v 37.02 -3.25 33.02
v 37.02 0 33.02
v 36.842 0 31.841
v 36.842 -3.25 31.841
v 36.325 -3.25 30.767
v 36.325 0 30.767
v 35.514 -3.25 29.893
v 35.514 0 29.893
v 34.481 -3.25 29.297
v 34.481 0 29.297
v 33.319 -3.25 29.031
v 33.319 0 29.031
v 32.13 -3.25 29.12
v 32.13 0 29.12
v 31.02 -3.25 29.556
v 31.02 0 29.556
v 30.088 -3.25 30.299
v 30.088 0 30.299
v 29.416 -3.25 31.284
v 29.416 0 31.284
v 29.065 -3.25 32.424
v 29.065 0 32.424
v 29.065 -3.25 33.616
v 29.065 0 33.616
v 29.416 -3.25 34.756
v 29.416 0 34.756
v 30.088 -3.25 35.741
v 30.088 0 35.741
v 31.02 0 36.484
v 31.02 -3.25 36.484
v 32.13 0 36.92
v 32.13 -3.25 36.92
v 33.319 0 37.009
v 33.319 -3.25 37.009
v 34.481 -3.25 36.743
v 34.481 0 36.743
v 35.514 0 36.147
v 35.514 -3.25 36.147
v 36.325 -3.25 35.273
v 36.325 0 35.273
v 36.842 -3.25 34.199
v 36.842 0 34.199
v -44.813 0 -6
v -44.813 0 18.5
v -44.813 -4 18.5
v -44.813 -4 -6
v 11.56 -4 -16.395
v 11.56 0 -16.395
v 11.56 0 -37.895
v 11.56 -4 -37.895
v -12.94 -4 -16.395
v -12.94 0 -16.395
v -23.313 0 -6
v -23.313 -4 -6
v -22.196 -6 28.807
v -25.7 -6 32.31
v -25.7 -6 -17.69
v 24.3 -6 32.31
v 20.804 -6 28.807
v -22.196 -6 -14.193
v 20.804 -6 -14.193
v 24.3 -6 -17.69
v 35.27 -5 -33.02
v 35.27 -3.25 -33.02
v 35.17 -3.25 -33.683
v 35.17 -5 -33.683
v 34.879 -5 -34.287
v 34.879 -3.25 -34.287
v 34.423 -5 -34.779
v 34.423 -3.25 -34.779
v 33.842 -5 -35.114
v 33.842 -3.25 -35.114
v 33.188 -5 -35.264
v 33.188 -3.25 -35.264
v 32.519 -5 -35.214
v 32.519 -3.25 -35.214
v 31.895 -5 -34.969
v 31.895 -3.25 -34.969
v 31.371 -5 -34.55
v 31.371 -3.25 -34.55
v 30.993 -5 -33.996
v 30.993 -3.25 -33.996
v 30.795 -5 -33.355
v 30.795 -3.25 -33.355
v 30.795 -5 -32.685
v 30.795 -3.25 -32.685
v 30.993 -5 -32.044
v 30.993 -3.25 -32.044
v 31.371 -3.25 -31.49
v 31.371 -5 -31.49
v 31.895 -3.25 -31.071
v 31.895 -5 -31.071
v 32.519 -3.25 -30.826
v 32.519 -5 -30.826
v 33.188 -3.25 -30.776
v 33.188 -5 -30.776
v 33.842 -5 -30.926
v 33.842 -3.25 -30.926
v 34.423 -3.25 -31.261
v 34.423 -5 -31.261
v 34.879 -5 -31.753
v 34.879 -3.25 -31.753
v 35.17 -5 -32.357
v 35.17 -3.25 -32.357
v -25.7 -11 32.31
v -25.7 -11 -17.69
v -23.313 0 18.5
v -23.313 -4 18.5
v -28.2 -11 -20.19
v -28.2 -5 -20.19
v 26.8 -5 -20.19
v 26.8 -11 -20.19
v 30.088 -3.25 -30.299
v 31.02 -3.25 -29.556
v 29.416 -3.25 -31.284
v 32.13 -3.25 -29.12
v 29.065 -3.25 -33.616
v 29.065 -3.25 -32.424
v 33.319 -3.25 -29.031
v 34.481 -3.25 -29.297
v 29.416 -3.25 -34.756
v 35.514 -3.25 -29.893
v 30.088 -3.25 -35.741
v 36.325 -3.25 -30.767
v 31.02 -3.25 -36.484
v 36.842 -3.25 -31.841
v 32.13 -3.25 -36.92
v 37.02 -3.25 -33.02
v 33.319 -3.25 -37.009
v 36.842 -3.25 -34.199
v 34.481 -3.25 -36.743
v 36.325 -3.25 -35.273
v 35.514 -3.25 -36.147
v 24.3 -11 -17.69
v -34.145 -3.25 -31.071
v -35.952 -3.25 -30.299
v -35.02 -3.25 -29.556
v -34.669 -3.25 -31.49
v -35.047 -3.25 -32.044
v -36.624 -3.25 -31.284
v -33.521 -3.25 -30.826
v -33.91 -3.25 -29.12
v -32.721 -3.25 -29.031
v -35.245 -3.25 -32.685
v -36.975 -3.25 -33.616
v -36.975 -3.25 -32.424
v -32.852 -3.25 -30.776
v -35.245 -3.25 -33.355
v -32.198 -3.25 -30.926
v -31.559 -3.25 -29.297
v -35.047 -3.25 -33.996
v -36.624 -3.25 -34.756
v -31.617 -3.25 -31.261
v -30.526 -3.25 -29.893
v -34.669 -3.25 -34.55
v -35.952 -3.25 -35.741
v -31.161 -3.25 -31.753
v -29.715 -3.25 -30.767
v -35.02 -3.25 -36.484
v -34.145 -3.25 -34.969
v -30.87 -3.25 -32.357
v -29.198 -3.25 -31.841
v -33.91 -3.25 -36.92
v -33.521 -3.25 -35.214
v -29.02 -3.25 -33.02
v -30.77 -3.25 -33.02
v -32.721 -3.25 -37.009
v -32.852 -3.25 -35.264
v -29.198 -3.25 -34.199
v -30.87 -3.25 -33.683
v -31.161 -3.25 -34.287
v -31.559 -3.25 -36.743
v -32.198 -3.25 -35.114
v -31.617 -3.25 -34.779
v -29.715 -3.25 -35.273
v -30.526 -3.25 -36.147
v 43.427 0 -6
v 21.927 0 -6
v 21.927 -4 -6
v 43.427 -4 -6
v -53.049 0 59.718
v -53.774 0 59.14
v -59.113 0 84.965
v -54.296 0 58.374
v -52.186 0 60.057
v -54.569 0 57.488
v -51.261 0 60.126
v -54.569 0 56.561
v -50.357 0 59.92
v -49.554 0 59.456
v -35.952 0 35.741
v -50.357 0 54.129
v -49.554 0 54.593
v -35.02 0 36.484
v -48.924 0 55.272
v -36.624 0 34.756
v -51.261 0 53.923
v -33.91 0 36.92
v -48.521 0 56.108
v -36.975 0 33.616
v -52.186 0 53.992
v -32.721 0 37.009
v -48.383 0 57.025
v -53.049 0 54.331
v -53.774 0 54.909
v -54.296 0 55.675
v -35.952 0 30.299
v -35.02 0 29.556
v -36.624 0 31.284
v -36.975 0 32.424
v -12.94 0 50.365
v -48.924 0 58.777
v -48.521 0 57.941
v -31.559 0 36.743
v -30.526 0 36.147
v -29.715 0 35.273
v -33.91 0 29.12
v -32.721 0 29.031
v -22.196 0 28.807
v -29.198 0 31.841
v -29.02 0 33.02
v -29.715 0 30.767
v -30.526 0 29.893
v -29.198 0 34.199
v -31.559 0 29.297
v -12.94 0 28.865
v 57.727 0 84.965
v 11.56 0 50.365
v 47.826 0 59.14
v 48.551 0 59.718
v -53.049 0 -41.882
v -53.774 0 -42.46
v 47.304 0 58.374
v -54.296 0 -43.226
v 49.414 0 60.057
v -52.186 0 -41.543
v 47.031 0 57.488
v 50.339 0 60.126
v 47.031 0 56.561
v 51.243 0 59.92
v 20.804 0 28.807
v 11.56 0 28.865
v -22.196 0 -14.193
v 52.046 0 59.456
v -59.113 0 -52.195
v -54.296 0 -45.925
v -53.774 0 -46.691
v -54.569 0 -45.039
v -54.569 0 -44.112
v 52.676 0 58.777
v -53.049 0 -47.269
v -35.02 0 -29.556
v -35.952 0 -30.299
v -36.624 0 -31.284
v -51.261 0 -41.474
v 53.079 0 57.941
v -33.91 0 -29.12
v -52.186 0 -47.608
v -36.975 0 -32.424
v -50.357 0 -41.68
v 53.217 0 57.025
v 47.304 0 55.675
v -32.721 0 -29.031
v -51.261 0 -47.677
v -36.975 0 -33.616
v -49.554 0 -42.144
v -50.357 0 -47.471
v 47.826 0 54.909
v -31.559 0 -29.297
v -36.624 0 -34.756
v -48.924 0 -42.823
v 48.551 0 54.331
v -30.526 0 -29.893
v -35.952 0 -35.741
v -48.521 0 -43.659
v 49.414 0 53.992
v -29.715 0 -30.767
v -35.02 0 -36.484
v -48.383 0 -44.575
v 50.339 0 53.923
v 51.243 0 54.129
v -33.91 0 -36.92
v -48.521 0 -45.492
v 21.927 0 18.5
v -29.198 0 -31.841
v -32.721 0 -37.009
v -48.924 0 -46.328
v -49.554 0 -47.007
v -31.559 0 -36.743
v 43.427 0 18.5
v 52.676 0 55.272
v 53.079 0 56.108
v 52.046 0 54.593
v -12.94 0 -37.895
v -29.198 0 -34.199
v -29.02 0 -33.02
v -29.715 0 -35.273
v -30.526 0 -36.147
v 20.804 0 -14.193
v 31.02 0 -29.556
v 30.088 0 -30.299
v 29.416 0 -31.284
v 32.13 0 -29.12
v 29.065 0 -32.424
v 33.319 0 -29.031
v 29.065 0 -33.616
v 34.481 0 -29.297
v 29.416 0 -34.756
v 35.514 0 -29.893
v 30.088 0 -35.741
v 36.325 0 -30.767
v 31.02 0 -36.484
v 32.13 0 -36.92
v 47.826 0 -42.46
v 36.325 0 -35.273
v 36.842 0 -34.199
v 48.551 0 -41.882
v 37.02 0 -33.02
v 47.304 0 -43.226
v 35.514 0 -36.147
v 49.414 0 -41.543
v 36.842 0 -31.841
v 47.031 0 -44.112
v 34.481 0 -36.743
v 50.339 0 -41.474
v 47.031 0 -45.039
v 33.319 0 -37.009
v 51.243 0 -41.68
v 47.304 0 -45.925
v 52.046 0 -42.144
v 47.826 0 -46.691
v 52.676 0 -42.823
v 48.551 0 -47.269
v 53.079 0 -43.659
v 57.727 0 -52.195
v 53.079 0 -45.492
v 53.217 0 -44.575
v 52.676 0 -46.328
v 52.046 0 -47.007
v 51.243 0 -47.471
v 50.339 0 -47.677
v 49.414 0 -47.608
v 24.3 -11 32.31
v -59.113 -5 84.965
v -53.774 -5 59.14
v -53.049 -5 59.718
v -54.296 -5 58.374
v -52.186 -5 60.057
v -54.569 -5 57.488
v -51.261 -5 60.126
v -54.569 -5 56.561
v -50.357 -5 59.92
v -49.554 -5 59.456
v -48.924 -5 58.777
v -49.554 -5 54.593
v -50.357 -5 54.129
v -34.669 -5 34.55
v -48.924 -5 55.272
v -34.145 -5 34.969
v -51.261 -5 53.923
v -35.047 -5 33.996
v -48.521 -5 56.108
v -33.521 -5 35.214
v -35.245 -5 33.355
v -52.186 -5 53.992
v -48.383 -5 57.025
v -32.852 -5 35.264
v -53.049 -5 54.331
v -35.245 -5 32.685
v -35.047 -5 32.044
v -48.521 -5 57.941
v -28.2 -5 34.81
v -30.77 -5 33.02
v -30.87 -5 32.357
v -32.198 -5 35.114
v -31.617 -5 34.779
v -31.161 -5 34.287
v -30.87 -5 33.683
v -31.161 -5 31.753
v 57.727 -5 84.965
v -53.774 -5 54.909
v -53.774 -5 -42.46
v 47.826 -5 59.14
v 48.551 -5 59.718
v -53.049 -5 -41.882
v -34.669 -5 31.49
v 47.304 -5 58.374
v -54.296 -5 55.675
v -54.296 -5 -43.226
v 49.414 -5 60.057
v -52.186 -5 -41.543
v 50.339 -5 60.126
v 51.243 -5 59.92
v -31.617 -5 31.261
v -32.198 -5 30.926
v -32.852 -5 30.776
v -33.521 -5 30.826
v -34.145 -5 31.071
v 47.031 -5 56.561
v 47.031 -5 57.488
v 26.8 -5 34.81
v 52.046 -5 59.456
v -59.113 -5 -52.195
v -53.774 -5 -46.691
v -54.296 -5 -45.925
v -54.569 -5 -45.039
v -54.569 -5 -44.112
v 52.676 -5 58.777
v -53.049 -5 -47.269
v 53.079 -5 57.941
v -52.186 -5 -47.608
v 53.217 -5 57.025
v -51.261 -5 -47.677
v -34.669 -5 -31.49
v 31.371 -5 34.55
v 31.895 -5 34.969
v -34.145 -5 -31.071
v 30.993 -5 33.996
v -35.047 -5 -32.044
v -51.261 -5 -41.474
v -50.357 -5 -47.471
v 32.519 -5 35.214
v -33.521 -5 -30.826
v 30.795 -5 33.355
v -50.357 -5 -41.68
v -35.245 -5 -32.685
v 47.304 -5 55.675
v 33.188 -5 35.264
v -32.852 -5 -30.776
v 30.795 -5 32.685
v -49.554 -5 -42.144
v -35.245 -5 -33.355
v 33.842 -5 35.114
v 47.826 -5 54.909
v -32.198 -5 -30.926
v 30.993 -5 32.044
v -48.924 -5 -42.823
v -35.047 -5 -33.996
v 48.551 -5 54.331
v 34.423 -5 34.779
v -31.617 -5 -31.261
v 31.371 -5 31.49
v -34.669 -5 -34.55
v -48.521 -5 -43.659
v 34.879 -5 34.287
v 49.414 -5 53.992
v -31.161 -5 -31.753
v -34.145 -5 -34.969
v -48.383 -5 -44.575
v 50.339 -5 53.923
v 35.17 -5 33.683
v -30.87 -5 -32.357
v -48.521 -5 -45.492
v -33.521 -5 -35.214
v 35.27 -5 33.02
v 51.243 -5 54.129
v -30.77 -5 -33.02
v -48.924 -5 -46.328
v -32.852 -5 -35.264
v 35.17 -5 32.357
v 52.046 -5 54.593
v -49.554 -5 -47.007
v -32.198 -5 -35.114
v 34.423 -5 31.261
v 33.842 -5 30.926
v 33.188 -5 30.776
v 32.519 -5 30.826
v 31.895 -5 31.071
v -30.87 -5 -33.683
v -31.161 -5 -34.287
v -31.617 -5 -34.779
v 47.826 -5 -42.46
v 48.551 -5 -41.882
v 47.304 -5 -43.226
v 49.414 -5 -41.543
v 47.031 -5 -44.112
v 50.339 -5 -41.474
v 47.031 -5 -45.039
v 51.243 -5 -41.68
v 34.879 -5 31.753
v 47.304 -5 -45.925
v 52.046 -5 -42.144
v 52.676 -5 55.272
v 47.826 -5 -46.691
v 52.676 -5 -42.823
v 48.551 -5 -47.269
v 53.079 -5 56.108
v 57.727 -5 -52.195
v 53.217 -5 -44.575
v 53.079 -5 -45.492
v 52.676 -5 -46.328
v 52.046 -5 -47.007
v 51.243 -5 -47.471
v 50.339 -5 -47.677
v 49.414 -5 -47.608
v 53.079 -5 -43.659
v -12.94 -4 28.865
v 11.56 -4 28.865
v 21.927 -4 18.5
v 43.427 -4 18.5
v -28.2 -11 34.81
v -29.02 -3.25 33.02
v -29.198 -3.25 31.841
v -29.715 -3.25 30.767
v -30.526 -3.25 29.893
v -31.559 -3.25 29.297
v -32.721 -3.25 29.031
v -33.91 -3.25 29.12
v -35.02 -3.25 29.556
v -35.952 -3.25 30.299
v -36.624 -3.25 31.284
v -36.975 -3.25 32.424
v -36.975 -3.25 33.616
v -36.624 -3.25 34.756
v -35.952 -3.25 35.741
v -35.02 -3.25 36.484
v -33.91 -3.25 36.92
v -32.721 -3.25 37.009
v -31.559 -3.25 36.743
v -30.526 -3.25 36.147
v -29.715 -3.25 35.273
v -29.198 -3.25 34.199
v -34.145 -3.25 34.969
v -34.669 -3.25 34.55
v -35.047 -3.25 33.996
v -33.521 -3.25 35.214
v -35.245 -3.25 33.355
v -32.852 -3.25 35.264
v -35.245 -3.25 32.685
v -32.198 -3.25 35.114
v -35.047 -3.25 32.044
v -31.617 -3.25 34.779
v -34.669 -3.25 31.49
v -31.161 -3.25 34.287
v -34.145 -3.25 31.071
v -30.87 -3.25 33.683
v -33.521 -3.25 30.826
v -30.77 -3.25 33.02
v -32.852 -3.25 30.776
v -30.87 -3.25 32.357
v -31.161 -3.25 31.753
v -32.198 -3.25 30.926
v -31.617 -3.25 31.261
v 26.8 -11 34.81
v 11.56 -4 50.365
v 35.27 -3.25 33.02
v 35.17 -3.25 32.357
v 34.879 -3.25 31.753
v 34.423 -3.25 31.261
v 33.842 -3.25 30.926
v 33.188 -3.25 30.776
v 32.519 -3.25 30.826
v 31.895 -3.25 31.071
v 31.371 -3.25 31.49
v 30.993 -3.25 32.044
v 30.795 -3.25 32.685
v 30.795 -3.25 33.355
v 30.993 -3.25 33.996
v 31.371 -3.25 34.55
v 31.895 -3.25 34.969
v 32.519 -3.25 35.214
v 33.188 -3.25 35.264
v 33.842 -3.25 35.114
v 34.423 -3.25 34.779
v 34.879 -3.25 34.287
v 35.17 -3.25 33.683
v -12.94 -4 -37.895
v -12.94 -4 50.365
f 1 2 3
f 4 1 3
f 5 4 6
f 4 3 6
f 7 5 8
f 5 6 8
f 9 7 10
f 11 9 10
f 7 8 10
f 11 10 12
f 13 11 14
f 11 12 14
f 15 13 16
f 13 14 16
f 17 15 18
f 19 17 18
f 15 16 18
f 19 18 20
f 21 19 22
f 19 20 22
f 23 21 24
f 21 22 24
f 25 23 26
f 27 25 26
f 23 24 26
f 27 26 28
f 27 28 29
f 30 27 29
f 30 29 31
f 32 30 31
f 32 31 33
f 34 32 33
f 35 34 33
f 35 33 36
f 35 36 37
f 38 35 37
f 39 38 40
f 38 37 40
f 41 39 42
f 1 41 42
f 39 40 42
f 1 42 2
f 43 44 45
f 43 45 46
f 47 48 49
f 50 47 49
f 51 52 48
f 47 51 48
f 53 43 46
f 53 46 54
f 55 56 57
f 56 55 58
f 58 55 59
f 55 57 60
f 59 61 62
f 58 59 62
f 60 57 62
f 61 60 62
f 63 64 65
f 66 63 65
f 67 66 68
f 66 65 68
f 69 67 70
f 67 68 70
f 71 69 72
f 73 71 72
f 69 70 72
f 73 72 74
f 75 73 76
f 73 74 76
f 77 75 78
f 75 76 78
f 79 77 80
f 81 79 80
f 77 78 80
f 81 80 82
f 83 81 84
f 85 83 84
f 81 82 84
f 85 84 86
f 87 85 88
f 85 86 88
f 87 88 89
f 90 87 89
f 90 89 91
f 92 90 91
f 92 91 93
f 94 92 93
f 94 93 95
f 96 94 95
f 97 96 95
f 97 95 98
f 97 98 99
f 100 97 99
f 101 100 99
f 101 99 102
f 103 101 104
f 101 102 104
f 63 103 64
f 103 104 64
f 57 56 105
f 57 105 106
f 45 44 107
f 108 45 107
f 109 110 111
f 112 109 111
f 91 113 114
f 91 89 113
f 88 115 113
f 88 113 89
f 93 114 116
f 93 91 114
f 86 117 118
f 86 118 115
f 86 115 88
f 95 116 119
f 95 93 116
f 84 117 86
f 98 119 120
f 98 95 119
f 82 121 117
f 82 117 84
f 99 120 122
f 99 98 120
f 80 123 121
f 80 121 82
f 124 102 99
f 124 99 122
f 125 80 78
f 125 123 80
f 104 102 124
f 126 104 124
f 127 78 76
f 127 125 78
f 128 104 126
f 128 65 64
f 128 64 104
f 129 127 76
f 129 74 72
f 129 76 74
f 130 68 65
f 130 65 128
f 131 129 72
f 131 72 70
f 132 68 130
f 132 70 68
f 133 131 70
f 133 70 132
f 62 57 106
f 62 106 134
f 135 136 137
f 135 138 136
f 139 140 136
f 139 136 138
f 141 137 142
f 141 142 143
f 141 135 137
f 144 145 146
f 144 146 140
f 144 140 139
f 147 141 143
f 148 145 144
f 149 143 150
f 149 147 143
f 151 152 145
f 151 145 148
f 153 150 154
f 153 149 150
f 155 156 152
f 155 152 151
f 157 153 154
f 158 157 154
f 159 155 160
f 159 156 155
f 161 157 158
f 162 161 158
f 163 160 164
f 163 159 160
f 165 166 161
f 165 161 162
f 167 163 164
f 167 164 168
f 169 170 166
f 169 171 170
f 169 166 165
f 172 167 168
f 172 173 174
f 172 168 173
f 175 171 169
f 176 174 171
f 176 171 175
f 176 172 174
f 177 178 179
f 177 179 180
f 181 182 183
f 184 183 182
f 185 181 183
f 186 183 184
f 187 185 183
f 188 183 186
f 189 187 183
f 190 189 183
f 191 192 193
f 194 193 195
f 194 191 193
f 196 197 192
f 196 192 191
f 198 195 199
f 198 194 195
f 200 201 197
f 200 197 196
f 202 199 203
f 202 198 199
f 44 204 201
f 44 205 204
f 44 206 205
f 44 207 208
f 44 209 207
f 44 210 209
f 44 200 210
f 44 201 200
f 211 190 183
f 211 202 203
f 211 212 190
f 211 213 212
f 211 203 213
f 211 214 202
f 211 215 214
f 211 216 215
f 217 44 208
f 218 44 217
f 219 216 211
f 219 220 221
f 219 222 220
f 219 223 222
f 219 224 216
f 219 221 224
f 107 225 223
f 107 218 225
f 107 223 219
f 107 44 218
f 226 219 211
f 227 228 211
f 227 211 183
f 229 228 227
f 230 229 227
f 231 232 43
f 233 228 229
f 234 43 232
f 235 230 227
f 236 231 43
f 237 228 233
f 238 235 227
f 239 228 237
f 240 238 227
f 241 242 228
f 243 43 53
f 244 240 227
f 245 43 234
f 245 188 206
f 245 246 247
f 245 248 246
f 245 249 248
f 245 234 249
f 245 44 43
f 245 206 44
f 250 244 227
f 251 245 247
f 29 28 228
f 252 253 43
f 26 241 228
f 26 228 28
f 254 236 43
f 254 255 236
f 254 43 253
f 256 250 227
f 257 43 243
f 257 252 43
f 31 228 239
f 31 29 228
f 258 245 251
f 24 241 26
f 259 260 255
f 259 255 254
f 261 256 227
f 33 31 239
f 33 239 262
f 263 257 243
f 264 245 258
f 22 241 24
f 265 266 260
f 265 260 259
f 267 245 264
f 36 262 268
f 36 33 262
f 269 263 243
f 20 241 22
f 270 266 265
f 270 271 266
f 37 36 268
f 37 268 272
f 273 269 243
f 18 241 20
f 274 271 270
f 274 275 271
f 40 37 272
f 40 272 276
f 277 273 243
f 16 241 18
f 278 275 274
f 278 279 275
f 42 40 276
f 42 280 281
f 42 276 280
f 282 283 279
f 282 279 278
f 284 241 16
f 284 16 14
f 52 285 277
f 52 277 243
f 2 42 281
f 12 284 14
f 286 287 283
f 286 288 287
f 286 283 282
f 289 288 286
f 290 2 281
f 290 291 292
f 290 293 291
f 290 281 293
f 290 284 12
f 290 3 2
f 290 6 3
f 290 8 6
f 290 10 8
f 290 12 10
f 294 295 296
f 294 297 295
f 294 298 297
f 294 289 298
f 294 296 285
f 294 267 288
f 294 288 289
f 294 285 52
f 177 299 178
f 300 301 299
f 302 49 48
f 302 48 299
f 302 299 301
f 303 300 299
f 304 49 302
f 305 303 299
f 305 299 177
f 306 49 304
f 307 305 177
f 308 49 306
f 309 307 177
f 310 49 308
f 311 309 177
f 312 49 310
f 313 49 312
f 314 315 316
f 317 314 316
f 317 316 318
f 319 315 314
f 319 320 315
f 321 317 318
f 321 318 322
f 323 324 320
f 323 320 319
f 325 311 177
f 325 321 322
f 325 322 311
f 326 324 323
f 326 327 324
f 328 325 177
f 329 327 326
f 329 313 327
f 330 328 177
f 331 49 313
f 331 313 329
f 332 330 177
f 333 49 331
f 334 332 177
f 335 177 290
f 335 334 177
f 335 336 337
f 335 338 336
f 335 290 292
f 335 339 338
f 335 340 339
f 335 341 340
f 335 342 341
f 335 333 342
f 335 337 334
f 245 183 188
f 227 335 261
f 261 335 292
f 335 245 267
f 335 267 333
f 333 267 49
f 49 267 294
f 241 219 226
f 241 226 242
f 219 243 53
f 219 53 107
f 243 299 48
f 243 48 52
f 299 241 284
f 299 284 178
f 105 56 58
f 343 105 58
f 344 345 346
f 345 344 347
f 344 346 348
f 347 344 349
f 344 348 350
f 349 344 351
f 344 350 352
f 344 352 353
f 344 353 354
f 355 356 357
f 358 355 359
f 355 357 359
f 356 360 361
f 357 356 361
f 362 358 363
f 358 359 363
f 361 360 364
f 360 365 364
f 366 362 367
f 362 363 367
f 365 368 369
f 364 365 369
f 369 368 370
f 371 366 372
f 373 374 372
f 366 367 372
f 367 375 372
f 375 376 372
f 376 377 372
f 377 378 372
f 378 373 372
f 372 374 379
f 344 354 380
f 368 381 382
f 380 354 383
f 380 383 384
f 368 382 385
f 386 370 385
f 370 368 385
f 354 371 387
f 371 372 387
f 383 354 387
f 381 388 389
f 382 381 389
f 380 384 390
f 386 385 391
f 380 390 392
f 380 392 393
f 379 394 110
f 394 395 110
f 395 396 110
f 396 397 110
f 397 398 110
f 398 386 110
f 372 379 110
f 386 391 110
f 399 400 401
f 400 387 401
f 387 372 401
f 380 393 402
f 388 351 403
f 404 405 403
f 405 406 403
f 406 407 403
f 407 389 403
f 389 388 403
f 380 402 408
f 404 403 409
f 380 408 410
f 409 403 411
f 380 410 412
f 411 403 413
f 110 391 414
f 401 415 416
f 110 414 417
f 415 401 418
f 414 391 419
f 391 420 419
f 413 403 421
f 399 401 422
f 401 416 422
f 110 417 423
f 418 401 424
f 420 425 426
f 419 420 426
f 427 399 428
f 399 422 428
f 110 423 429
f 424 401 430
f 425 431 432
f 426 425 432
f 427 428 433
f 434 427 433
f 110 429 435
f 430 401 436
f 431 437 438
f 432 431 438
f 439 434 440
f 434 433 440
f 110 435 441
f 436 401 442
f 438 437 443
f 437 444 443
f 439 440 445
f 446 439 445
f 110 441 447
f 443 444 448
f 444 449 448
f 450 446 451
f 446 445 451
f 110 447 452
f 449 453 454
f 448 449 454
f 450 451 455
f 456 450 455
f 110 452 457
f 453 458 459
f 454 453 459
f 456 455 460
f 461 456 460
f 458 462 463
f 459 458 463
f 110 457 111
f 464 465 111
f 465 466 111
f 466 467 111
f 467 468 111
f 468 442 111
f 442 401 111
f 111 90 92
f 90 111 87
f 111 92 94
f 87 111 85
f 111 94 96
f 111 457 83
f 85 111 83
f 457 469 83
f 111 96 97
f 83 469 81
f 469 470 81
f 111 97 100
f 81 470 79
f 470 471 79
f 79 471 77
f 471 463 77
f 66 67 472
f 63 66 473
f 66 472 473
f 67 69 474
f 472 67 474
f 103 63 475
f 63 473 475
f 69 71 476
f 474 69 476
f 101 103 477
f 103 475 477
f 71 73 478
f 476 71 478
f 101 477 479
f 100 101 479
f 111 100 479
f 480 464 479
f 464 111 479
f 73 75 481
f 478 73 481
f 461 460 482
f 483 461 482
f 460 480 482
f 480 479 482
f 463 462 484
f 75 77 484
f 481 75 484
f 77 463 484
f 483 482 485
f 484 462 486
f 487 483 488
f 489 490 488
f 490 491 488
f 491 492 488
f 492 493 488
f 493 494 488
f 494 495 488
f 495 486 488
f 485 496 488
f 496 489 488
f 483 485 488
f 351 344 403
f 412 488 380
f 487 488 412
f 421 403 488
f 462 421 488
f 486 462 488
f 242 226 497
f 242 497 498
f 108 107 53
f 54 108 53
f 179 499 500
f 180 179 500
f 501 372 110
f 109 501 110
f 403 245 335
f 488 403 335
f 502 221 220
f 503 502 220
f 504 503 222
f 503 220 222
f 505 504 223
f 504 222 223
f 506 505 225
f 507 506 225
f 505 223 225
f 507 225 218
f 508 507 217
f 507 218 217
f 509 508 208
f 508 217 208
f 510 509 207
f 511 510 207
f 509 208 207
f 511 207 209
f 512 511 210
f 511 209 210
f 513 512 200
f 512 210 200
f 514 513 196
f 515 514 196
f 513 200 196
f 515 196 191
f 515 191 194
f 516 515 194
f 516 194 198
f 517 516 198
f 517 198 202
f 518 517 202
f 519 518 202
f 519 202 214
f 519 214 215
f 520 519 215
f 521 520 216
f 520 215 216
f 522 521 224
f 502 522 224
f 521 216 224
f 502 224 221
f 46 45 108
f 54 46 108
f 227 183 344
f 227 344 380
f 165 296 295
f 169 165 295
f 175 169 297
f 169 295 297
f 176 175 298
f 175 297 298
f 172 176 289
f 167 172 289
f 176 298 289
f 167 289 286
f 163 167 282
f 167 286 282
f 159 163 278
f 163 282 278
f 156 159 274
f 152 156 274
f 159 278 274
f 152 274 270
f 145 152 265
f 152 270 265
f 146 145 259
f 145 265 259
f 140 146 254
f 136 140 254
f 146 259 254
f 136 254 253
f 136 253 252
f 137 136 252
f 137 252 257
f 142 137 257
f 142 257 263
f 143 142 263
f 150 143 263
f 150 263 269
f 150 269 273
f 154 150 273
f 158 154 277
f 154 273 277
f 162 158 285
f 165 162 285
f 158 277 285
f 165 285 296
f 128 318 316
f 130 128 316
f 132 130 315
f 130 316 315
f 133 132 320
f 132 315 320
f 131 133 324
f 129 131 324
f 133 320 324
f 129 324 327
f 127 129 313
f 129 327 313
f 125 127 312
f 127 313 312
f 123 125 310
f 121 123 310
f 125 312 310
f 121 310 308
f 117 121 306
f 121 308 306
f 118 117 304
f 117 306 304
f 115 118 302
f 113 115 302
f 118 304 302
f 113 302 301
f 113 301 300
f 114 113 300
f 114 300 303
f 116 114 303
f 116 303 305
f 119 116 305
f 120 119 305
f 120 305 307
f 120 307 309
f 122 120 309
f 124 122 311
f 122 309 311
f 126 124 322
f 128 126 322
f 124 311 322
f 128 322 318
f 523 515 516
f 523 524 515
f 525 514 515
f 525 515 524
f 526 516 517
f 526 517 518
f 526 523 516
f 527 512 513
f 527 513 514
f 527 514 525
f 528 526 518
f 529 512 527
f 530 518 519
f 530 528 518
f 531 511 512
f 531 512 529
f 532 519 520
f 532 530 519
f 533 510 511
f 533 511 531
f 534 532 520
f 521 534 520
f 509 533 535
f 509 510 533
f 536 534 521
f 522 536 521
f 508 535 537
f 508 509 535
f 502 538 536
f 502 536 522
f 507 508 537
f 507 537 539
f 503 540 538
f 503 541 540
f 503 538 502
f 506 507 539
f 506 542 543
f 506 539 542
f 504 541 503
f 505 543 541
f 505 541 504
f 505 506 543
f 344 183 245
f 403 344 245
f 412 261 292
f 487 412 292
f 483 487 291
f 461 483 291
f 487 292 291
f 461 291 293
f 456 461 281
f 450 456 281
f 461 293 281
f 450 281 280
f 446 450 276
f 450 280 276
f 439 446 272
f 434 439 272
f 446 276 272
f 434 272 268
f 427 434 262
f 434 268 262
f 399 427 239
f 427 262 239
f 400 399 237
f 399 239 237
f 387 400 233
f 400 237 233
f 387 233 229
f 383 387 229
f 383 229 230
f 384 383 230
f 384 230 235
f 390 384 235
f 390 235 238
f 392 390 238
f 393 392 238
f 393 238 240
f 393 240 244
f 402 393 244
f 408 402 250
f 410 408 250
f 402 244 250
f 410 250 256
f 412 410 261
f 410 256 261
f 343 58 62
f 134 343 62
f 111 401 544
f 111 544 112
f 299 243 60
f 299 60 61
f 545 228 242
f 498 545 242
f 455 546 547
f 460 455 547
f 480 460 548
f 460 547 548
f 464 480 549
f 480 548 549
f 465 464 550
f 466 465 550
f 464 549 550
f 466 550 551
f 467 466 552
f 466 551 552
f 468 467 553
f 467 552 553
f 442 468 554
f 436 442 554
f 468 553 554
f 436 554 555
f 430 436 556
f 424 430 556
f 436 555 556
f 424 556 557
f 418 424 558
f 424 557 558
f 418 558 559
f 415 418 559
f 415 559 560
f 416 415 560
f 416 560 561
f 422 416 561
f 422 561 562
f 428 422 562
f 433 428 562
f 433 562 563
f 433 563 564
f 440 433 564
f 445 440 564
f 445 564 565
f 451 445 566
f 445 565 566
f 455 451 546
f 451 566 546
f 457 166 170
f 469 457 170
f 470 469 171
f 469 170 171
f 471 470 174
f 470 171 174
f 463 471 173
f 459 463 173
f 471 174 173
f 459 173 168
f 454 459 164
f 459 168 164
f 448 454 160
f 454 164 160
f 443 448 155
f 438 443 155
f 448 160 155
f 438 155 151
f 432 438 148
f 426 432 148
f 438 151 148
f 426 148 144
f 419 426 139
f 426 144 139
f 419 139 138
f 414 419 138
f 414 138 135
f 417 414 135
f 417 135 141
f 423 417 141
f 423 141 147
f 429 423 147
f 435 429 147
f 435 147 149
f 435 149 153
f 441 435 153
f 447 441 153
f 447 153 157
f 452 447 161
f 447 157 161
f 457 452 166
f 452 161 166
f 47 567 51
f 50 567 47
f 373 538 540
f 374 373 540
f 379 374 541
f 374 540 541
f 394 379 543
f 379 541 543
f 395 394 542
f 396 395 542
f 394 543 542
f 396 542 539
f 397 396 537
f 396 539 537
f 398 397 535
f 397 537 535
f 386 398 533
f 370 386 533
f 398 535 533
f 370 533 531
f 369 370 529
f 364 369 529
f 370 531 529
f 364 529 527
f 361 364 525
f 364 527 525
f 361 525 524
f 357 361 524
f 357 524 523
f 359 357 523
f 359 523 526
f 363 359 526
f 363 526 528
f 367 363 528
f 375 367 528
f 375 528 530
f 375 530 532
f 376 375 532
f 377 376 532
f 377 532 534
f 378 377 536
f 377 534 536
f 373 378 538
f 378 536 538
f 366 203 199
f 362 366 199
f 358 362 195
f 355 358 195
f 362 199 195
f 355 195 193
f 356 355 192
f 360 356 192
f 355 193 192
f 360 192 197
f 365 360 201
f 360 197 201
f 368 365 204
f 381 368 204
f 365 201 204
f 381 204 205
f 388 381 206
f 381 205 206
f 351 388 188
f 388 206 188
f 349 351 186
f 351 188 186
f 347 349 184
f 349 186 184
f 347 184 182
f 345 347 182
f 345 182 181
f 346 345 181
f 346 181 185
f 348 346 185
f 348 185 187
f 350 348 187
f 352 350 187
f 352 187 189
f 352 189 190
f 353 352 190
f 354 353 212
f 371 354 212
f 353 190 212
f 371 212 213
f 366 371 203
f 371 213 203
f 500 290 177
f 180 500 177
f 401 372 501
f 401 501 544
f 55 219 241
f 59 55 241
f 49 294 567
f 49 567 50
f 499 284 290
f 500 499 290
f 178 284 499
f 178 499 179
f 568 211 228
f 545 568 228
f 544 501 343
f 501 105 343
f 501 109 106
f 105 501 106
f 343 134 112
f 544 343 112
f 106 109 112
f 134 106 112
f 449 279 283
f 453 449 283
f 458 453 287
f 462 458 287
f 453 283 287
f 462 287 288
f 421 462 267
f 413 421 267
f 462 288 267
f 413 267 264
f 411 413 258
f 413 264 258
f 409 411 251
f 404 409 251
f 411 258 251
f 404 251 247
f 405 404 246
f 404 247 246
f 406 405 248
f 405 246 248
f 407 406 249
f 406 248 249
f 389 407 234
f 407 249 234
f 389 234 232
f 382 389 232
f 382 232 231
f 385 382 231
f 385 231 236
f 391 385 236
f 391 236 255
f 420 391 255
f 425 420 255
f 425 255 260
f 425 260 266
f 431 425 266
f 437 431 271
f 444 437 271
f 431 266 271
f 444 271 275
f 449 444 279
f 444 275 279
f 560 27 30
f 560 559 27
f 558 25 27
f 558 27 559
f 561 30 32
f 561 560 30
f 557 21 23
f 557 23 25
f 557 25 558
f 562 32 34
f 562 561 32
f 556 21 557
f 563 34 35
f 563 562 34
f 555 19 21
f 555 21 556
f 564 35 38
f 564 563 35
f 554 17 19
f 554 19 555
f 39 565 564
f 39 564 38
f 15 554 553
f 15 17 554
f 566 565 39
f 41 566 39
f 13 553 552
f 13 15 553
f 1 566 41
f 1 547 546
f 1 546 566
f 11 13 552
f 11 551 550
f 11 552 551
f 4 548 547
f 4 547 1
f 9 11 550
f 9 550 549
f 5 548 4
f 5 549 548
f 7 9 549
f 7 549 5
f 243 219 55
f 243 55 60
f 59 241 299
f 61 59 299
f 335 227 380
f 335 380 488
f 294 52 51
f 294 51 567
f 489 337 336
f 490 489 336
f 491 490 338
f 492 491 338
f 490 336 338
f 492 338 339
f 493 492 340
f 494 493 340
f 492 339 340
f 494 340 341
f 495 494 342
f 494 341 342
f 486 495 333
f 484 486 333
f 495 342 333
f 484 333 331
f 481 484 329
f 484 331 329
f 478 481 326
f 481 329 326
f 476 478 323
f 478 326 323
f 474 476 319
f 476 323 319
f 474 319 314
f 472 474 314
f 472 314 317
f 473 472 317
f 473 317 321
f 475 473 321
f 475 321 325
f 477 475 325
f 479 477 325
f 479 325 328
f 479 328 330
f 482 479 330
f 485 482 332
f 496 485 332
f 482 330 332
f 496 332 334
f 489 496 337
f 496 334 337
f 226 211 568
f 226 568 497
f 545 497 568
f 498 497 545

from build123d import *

# Parameters (mm, degrees)
SKETCH1_W                   = 116.84
SKETCH1_H                   = 137.16
SKETCH1_R                   = 3.110430672
BOSS_EXTRUDE1_DEPTH         = 5
SKETCH12_W                  = 85
SKETCH12_H                  = 23.975046692
BOSS_EXTRUDE15_DEPTH        = 5
SKETCH17_W                  = 50
SKETCH17_H                  = 50
BOSS_EXTRUDE18_DEPTH        = 6
SKETCH10_W                  = 43
SKETCH10_H                  = 43
BOSS_EXTRUDE19_DEPTH        = 25
SKETCH19_W                  = 55
SKETCH19_H                  = 55
BOSS_EXTRUDE20_DEPTH        = 11
SKETCH20_R                  = 2.25
BOSS_EXTRUDE22_DEPTH        = 25
BOSS_EXTRUDE22_2_DEPTH      = 25
BOSS_EXTRUDE22_3_DEPTH      = 25
BOSS_EXTRUDE22_4_DEPTH      = 25
SKETCH21_W                  = 24.5
SKETCH21_H                  = 21.5
BOSS_EXTRUDE23_DEPTH        = 4
SKETCH21_W_2                = 21.5
SKETCH21_H_2                = 24.5
BOSS_EXTRUDE23_2_DEPTH      = 4
BOSS_EXTRUDE23_3_DEPTH      = 4
BOSS_EXTRUDE23_4_DEPTH      = 4
SKETCH25_R                  = 4
BOSS_EXTRUDE24_DEPTH        = 10
BOSS_EXTRUDE24_DEPTH_BACK   = 3.25
BOSS_EXTRUDE24_2_DEPTH      = 10
BOSS_EXTRUDE24_2_DEPTH_BACK = 3.25
BOSS_EXTRUDE24_3_DEPTH      = 10
BOSS_EXTRUDE24_3_DEPTH_BACK = 3.25
BOSS_EXTRUDE24_4_DEPTH      = 10
BOSS_EXTRUDE24_4_DEPTH_BACK = 3.25


with BuildPart() as part:
    # Sketch1 → Boss-Extrude1 (new body)
    with BuildSketch(Plane(origin=(0, 0, 0), x_dir=(1, 0, 0), z_dir=(0, 1, 0))):
        with Locations((-0.693486938, -16.384561015)):
            Rectangle(SKETCH1_W, SKETCH1_H)
        with Locations((-51.493486938, 44.575438985)):
            Circle(SKETCH1_R, mode=Mode.SUBTRACT)
        with Locations((50.106513062, -57.024561015)):
            Circle(SKETCH1_R, mode=Mode.SUBTRACT)
        with Locations((-51.493486938, -57.024561015)):
            Circle(SKETCH1_R, mode=Mode.SUBTRACT)
        with Locations((50.106513062, 44.575438985)):
            Circle(SKETCH1_R, mode=Mode.SUBTRACT)
    extrude(amount=-BOSS_EXTRUDE1_DEPTH)


with BuildPart() as body_2:
    # Sketch12 → Boss-Extrude15 (new body)
    with BuildSketch(Plane(origin=(0, 0, 0), x_dir=(1, 0, 0), z_dir=(0, 1, 0))):
        with Locations((0, 58)):
            Rectangle(SKETCH12_W, SKETCH12_H)
    extrude(amount=BOSS_EXTRUDE15_DEPTH)


with BuildPart() as body_3:
    # Sketch17 → Boss-Extrude18 (new body)
    with BuildSketch(Plane(origin=(0, 0, 0), x_dir=(1, 0, 0), z_dir=(0, 1, 0))):
        with Locations((-0.7, -7.31)):
            Rectangle(SKETCH17_W, SKETCH17_H)
    extrude(amount=-BOSS_EXTRUDE18_DEPTH)


with BuildPart() as body_4:
    # Sketch10 → Boss-Extrude19 (new body, symmetric)
    with BuildSketch(Plane(origin=(0, 0, 0), x_dir=(1, 0, 0), z_dir=(0, 1, 0))):
        with Locations((-0.695517903, -7.307291257)):
            Rectangle(SKETCH10_W, SKETCH10_H)
    extrude(amount=BOSS_EXTRUDE19_DEPTH, both=True)


with BuildPart() as body_5:
    # Sketch19 → Boss-Extrude20 (new body)
    with BuildSketch(Plane(origin=(0, 0, 0), x_dir=(1, 0, 0), z_dir=(0, 1, 0))):
        with Locations((-0.7, -7.31)):
            Rectangle(SKETCH19_W, SKETCH19_H)
    extrude(amount=-BOSS_EXTRUDE20_DEPTH)


with BuildPart() as part_1:
    add(part.part)

    # Combine1: cut body 2
    add(body_2.part, mode=Mode.SUBTRACT)


with BuildPart() as body_3_1:
    # Body-Move/Copy4: moved
    add(body_3.part.moved(Location((0, -6, 0))))


with BuildPart() as body_5_1:
    add(body_5.part)

    # Combine4: cut body 3
    add(body_3_1.part, mode=Mode.SUBTRACT)

    # Combine7: union part
    add(part_1.part)

    # Combine8: cut body 4
    add(body_4.part, mode=Mode.SUBTRACT)


with BuildPart() as body_2_2:
    # Sketch20 → Boss-Extrude22 (new body, symmetric)
    with BuildSketch(Plane(origin=(0, 0, 0), x_dir=(1, 0, 0), z_dir=(0, 1, 0))):
        with Locations((33.02, 33.02)):
            Circle(SKETCH20_R)
    extrude(amount=BOSS_EXTRUDE22_DEPTH, both=True)


with BuildPart() as body_3_2:
    # Sketch20 → Boss-Extrude22 2 (new body, symmetric)
    with BuildSketch(Plane(origin=(0, 0, 0), x_dir=(1, 0, 0), z_dir=(0, 1, 0))):
        with Locations((33.02, -33.02)):
            Circle(SKETCH20_R)
    extrude(amount=BOSS_EXTRUDE22_2_DEPTH, both=True)


with BuildPart() as body_4_2:
    # Sketch20 → Boss-Extrude22 3 (new body, symmetric)
    with BuildSketch(Plane(origin=(0, 0, 0), x_dir=(1, 0, 0), z_dir=(0, 1, 0))):
        with Locations((-33.02, -33.02)):
            Circle(SKETCH20_R)
    extrude(amount=BOSS_EXTRUDE22_3_DEPTH, both=True)


with BuildPart() as body_5_2:
    # Sketch20 → Boss-Extrude22 4 (new body, symmetric)
    with BuildSketch(Plane(origin=(0, 0, 0), x_dir=(1, 0, 0), z_dir=(0, 1, 0))):
        with Locations((-33.02, 33.02)):
            Circle(SKETCH20_R)
    extrude(amount=BOSS_EXTRUDE22_4_DEPTH, both=True)


with BuildPart() as body_5_3:
    add(body_5_1.part)

    # Combine9: cut body 4 2, body 3 2, body 2 2, body 5 2
    add(body_4_2.part, mode=Mode.SUBTRACT)
    add(body_3_2.part, mode=Mode.SUBTRACT)
    add(body_2_2.part, mode=Mode.SUBTRACT)
    add(body_5_2.part, mode=Mode.SUBTRACT)


with BuildPart() as body_2_3:
    # Sketch21 → Boss-Extrude23 (new body)
    with BuildSketch(Plane(origin=(0, 0, 0), x_dir=(1, 0, 0), z_dir=(0, 1, 0))):
        with Locations((-0.69, 27.145438985)):
            Rectangle(SKETCH21_W, SKETCH21_H)
    extrude(amount=-BOSS_EXTRUDE23_DEPTH)


with BuildPart() as body_3_3:
    # Sketch21 → Boss-Extrude23 2 (new body)
    with BuildSketch(Plane(origin=(0, 0, 0), x_dir=(1, 0, 0), z_dir=(0, 1, 0))):
        with Locations((32.676513062, -6.25)):
            Rectangle(SKETCH21_W_2, SKETCH21_H_2)
    extrude(amount=-BOSS_EXTRUDE23_2_DEPTH)


with BuildPart() as body_4_3:
    # Sketch21 → Boss-Extrude23 3 (new body)
    with BuildSketch(Plane(origin=(0, 0, 0), x_dir=(1, 0, 0), z_dir=(0, 1, 0))):
        with Locations((-34.063486938, -6.25)):
            Rectangle(SKETCH21_W_2, SKETCH21_H_2)
    extrude(amount=-BOSS_EXTRUDE23_3_DEPTH)


with BuildPart() as body_5_3_1:
    # Sketch21 → Boss-Extrude23 4 (new body)
    with BuildSketch(Plane(origin=(0, 0, 0), x_dir=(1, 0, 0), z_dir=(0, 1, 0))):
        with Locations((-0.69, -39.614561015)):
            Rectangle(SKETCH21_W, SKETCH21_H)
    extrude(amount=-BOSS_EXTRUDE23_4_DEPTH)


with BuildPart() as body_5_4:
    add(body_5_3.part)

    # Combine10: cut body 3 3, body 2 3, body 5 3, body 4 3
    add(body_3_3.part, mode=Mode.SUBTRACT)
    add(body_2_3.part, mode=Mode.SUBTRACT)
    add(body_5_3_1.part, mode=Mode.SUBTRACT)
    add(body_4_3.part, mode=Mode.SUBTRACT)


with BuildPart() as body_2_4:
    # Sketch25 → Boss-Extrude24 (new body, two sides)
    with BuildSketch(Plane(origin=(0, 0, 0), x_dir=(1, 0, 0), z_dir=(0, 1, 0))) as boss_extrude24_sk:
        with Locations((33.02, 33.02)):
            Circle(SKETCH25_R)
    extrude(amount=BOSS_EXTRUDE24_DEPTH)
    extrude(boss_extrude24_sk.sketch, amount=-BOSS_EXTRUDE24_DEPTH_BACK)


with BuildPart() as body_3_4:
    # Sketch25 → Boss-Extrude24 2 (new body, two sides)
    with BuildSketch(Plane(origin=(0, 0, 0), x_dir=(1, 0, 0), z_dir=(0, 1, 0))) as boss_extrude24_2_sk:
        with Locations((-33.02, 33.02)):
            Circle(SKETCH25_R)
    extrude(amount=BOSS_EXTRUDE24_2_DEPTH)
    extrude(boss_extrude24_2_sk.sketch, amount=-BOSS_EXTRUDE24_2_DEPTH_BACK)


with BuildPart() as body_4_4:
    # Sketch25 → Boss-Extrude24 3 (new body, two sides)
    with BuildSketch(Plane(origin=(0, 0, 0), x_dir=(1, 0, 0), z_dir=(0, 1, 0))) as boss_extrude24_3_sk:
        with Locations((-33.02, -33.02)):
            Circle(SKETCH25_R)
    extrude(amount=BOSS_EXTRUDE24_3_DEPTH)
    extrude(boss_extrude24_3_sk.sketch, amount=-BOSS_EXTRUDE24_3_DEPTH_BACK)


with BuildPart() as body_5_4_1:
    # Sketch25 → Boss-Extrude24 4 (new body, two sides)
    with BuildSketch(Plane(origin=(0, 0, 0), x_dir=(1, 0, 0), z_dir=(0, 1, 0))) as boss_extrude24_4_sk:
        with Locations((33.02, -33.02)):
            Circle(SKETCH25_R)
    extrude(amount=BOSS_EXTRUDE24_4_DEPTH)
    extrude(boss_extrude24_4_sk.sketch, amount=-BOSS_EXTRUDE24_4_DEPTH_BACK)


with BuildPart() as body_5_5:
    add(body_5_4.part)

    # Combine11: cut body 4 4, body 3 4, body 2 4, body 5 4
    add(body_4_4.part, mode=Mode.SUBTRACT)
    add(body_3_4.part, mode=Mode.SUBTRACT)
    add(body_2_4.part, mode=Mode.SUBTRACT)
    add(body_5_4_1.part, mode=Mode.SUBTRACT)


solid = body_5_5.part
